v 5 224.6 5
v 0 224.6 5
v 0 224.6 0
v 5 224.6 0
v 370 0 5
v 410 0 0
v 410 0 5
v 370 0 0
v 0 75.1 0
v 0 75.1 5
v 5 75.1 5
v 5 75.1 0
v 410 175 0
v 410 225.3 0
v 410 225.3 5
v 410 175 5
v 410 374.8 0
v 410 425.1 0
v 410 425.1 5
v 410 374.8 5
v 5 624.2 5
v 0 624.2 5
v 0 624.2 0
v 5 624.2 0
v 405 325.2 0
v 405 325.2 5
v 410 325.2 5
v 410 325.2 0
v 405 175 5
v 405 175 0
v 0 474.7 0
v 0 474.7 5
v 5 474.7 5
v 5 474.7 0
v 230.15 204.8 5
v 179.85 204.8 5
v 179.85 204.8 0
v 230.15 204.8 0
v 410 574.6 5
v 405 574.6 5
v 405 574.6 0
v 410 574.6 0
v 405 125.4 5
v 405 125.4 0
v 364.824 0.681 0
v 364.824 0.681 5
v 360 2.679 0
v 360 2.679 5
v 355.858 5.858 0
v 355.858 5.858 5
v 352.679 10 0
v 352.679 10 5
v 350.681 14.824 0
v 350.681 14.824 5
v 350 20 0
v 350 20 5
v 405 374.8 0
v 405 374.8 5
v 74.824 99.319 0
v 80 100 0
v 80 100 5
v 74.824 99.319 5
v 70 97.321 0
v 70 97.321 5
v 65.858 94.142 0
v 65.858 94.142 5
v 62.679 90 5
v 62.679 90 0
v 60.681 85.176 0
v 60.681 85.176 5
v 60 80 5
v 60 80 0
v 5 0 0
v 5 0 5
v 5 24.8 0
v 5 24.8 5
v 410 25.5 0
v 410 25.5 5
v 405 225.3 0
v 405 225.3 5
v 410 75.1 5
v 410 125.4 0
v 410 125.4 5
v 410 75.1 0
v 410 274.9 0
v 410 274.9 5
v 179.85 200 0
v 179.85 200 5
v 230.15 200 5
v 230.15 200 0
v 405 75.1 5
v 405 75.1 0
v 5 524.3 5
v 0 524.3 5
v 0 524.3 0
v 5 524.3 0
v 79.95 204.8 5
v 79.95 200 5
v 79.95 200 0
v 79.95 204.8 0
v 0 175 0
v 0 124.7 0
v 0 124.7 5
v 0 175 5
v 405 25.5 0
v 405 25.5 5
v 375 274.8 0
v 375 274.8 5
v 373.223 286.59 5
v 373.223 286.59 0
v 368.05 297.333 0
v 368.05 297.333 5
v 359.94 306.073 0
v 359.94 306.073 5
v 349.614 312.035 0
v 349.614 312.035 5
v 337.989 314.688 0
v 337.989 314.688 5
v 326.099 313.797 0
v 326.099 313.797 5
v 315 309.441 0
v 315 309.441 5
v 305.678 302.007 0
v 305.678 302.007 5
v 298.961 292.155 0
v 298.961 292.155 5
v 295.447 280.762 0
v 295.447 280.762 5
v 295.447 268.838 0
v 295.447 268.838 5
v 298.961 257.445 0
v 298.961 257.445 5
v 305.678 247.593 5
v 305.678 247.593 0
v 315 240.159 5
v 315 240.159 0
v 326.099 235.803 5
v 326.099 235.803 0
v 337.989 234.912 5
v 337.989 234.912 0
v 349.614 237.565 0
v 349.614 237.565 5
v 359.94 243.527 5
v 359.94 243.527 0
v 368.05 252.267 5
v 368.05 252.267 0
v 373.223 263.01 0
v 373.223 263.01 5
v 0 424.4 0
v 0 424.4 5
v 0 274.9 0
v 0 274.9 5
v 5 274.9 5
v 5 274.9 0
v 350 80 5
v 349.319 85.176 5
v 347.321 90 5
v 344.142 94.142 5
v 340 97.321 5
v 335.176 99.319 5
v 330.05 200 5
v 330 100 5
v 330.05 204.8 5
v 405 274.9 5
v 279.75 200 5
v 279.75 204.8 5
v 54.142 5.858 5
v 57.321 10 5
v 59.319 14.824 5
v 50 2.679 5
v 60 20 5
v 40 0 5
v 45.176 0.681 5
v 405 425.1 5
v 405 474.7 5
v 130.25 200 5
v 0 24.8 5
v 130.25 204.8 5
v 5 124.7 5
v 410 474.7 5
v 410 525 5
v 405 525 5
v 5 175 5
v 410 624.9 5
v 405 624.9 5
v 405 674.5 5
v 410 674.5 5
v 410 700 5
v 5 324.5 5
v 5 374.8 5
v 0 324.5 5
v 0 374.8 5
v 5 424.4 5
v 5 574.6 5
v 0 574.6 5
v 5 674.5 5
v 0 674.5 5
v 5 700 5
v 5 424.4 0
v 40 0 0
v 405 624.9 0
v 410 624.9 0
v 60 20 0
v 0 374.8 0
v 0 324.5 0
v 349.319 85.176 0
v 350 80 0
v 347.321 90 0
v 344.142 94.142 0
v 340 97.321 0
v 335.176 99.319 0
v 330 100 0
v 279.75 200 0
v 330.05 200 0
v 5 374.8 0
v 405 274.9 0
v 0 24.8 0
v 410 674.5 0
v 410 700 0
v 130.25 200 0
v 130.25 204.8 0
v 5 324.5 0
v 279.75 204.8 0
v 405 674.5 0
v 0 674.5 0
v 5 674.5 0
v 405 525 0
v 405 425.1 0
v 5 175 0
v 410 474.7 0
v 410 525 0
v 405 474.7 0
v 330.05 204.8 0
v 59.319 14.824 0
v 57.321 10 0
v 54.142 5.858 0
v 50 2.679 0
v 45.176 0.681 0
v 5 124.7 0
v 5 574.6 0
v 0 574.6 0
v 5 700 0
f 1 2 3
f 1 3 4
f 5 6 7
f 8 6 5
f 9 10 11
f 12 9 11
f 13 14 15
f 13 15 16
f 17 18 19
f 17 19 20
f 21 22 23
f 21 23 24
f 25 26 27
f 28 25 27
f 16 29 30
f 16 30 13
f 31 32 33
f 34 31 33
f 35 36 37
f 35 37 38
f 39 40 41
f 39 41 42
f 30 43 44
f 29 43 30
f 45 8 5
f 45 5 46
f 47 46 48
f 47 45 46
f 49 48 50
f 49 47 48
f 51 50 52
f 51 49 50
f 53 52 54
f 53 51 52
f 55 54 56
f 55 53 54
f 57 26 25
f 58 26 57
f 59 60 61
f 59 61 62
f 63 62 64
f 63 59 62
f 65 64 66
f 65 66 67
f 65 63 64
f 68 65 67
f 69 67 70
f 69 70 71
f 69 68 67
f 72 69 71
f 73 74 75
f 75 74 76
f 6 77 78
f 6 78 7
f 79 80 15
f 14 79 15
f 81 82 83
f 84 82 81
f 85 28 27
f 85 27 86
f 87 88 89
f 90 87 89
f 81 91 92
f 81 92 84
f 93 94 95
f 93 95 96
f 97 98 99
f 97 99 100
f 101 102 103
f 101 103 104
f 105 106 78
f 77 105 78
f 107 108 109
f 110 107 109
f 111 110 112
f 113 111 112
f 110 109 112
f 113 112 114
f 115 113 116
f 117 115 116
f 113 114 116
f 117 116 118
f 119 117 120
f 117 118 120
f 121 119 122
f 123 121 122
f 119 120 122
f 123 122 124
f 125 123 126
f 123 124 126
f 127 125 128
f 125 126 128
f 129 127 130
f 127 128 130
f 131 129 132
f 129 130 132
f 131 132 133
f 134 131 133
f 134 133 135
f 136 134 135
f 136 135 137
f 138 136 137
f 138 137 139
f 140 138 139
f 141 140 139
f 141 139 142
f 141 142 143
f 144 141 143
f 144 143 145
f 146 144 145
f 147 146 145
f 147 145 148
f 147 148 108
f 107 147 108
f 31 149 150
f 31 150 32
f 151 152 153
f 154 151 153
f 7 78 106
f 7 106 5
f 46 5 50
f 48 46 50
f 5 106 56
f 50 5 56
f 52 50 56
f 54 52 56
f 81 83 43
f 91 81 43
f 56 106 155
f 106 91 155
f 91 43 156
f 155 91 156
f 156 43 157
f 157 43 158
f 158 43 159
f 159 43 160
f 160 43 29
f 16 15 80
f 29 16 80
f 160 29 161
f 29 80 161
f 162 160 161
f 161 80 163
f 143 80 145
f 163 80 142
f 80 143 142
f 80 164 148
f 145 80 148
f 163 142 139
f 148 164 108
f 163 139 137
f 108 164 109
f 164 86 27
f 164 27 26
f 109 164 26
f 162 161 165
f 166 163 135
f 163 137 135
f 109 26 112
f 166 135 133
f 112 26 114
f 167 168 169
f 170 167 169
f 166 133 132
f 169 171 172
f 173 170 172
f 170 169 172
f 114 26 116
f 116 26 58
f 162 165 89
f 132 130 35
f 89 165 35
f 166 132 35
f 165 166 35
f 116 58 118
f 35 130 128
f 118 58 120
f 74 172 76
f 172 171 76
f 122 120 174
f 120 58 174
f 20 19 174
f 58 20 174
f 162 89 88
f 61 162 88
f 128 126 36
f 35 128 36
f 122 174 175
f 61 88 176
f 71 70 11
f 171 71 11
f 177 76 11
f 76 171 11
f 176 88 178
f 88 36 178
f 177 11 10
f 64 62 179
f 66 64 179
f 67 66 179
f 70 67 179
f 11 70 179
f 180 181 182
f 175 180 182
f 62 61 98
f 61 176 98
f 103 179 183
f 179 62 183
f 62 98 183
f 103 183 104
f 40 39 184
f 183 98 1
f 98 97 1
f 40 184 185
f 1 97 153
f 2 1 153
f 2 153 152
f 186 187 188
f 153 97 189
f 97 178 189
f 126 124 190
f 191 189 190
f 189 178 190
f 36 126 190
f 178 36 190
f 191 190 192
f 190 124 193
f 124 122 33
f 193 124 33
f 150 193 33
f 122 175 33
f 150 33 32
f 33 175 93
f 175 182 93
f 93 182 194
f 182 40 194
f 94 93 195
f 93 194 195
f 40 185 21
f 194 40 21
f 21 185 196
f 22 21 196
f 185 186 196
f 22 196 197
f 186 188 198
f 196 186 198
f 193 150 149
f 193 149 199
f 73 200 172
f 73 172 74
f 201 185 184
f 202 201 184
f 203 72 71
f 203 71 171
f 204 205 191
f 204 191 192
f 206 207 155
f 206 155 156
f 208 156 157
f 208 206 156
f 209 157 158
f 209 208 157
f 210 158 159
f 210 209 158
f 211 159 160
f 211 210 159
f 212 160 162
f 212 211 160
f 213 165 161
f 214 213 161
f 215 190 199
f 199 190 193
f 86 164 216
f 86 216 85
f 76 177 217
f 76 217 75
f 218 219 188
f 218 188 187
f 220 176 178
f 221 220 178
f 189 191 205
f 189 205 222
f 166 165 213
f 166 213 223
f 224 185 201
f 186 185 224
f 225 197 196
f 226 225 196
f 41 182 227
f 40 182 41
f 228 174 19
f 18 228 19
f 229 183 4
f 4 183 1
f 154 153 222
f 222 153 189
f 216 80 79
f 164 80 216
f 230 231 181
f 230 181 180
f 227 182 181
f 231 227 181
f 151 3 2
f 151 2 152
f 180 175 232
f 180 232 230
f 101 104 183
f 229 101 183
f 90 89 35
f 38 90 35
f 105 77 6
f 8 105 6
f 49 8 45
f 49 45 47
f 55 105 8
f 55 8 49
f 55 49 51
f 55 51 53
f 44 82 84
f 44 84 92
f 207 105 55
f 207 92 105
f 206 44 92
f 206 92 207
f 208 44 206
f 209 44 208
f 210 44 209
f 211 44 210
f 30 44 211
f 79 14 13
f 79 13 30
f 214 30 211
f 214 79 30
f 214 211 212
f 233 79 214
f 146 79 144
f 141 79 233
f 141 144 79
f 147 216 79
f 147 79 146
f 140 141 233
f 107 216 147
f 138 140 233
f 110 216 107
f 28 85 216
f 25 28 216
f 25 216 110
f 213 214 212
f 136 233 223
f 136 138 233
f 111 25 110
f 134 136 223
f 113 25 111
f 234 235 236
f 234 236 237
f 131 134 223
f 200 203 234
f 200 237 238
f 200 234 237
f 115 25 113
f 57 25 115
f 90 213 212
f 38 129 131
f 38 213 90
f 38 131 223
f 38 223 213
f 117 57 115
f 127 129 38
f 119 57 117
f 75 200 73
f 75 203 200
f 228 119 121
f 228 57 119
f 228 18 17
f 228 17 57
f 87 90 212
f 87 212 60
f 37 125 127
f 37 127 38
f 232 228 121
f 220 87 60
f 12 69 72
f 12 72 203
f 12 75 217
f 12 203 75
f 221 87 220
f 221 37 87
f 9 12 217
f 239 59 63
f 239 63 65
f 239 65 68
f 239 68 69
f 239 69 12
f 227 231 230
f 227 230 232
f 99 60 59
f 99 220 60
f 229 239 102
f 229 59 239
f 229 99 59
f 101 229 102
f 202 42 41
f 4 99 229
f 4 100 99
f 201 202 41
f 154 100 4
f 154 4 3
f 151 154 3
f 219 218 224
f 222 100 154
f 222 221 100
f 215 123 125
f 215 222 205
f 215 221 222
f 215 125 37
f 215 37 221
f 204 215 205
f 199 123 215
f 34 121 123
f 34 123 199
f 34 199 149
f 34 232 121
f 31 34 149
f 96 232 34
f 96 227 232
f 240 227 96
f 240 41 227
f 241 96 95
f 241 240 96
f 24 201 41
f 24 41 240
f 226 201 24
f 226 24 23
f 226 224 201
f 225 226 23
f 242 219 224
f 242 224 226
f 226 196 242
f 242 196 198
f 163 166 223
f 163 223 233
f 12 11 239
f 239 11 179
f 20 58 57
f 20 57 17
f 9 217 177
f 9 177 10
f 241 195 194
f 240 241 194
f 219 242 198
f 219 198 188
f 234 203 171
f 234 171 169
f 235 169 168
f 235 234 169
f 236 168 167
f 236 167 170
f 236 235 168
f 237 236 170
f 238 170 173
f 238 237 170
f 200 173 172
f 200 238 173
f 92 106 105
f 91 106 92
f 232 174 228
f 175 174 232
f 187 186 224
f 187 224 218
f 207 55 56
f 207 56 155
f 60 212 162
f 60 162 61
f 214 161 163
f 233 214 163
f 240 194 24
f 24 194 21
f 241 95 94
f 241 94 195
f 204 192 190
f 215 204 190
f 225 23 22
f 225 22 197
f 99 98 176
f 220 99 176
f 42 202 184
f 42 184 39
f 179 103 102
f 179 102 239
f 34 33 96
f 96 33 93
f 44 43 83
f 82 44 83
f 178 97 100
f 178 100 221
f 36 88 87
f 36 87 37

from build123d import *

# Parameters (mm, degrees)
AUFSATZ_LINEAR_AUSTRAGEN1_DEPTH = 5
SKIZZE2_W                       = 50.3
SKIZZE2_H                       = 4.8
SCHNITT_LINEAR_AUSTRAGEN1_DEPTH = 5
LINEARES_MUSTER1_COUNT          = 3
LINEARES_MUSTER1_PITCH          = 99.9
SKIZZE3_W                       = 92.912444059
SKIZZE3_H                       = 49.6
SCHNITT_LINEAR_AUSTRAGEN2_DEPTH = 5
LINEARES_MUSTER2_COUNT          = 8
LINEARES_MUSTER2_PITCH          = 99.9
SKIZZE4_W                       = 86.468004991
SKIZZE4_H                       = 49.6
SCHNITT_LINEAR_AUSTRAGEN4_DEPTH = 5
LINEARES_MUSTER3_COUNT          = 7
LINEARES_MUSTER3_PITCH          = 99.9
SKIZZE8_R                       = 40
SCHNITT_LINEAR_AUSTRAGEN5_DEPTH = 10


with BuildPart() as part:
    # Skizze1 → Aufsatz-Linear austragen1 (new body)
    with BuildSketch(Plane.XY):
        with BuildLine():
            Line((0, 0), (0, 700))
            Line((0, 700), (410, 700))
            Line((410, 700), (410, 0))
            Line((410, 0), (370, 0))
            ThreePointArc((370, 0), (355.857864376, 5.857864376), (350, 20))
            Line((350, 20), (350, 80))
            ThreePointArc((350, 80), (344.142135624, 94.142135624), (330, 100))
            Line((330, 100), (80, 100))
            ThreePointArc((80, 100), (65.857864376, 94.142135624), (60, 80))
            Line((60, 80), (60, 20))
            ThreePointArc((60, 20), (54.142135624, 5.857864376), (40, 0))
            Line((40, 0), (0, 0))
        make_face()
    extrude(amount=AUFSATZ_LINEAR_AUSTRAGEN1_DEPTH)

    # Skizze2 → Schnitt-Linear austragen1 (cut)
    with BuildSketch(Plane.XY.offset(5)):
        with Locations((105.1, 202.4)):
            Rectangle(SKIZZE2_W, SKIZZE2_H)
    schnitt_linear_austragen1 = extrude(amount=-SCHNITT_LINEAR_AUSTRAGEN1_DEPTH, mode=Mode.SUBTRACT)

    # Lineares Muster1: Schnitt-Linear austragen1 ×3
    with Locations(*[(i * LINEARES_MUSTER1_PITCH, 0, 0) for i in range(1, LINEARES_MUSTER1_COUNT)]):
        add(schnitt_linear_austragen1, mode=Mode.SUBTRACT)

    # Skizze3 → Schnitt-Linear austragen2 (cut)
    with BuildSketch(Plane.XY.offset(5)):
        with Locations((-41.45622203, 699.3)):
            Rectangle(SKIZZE3_W, SKIZZE3_H)
    schnitt_linear_austragen2 = extrude(amount=-SCHNITT_LINEAR_AUSTRAGEN2_DEPTH, mode=Mode.SUBTRACT)

    # Lineares Muster2: Schnitt-Linear austragen2 ×8
    with Locations(*[(0, -i * LINEARES_MUSTER2_PITCH, 0) for i in range(1, LINEARES_MUSTER2_COUNT)]):
        add(schnitt_linear_austragen2, mode=Mode.SUBTRACT)

    # Skizze4 → Schnitt-Linear austragen4 (cut)
    with BuildSketch(Plane.XY.offset(5)):
        with Locations((448.234002496, 649.7)):
            Rectangle(SKIZZE4_W, SKIZZE4_H)
    schnitt_linear_austragen4 = extrude(amount=-SCHNITT_LINEAR_AUSTRAGEN4_DEPTH, mode=Mode.SUBTRACT)

    # Lineares Muster3: Schnitt-Linear austragen4 ×7
    with Locations(*[(0, -i * LINEARES_MUSTER3_PITCH, 0) for i in range(1, LINEARES_MUSTER3_COUNT)]):
        add(schnitt_linear_austragen4, mode=Mode.SUBTRACT)

    # Skizze8 → Schnitt-Linear austragen5 (cut)
    with BuildSketch(Plane.XY.offset(5)):
        with Locations((335, 274.8)):
            Circle(SKIZZE8_R)
    extrude(amount=-SCHNITT_LINEAR_AUSTRAGEN5_DEPTH, mode=Mode.SUBTRACT)


solid = part.part
